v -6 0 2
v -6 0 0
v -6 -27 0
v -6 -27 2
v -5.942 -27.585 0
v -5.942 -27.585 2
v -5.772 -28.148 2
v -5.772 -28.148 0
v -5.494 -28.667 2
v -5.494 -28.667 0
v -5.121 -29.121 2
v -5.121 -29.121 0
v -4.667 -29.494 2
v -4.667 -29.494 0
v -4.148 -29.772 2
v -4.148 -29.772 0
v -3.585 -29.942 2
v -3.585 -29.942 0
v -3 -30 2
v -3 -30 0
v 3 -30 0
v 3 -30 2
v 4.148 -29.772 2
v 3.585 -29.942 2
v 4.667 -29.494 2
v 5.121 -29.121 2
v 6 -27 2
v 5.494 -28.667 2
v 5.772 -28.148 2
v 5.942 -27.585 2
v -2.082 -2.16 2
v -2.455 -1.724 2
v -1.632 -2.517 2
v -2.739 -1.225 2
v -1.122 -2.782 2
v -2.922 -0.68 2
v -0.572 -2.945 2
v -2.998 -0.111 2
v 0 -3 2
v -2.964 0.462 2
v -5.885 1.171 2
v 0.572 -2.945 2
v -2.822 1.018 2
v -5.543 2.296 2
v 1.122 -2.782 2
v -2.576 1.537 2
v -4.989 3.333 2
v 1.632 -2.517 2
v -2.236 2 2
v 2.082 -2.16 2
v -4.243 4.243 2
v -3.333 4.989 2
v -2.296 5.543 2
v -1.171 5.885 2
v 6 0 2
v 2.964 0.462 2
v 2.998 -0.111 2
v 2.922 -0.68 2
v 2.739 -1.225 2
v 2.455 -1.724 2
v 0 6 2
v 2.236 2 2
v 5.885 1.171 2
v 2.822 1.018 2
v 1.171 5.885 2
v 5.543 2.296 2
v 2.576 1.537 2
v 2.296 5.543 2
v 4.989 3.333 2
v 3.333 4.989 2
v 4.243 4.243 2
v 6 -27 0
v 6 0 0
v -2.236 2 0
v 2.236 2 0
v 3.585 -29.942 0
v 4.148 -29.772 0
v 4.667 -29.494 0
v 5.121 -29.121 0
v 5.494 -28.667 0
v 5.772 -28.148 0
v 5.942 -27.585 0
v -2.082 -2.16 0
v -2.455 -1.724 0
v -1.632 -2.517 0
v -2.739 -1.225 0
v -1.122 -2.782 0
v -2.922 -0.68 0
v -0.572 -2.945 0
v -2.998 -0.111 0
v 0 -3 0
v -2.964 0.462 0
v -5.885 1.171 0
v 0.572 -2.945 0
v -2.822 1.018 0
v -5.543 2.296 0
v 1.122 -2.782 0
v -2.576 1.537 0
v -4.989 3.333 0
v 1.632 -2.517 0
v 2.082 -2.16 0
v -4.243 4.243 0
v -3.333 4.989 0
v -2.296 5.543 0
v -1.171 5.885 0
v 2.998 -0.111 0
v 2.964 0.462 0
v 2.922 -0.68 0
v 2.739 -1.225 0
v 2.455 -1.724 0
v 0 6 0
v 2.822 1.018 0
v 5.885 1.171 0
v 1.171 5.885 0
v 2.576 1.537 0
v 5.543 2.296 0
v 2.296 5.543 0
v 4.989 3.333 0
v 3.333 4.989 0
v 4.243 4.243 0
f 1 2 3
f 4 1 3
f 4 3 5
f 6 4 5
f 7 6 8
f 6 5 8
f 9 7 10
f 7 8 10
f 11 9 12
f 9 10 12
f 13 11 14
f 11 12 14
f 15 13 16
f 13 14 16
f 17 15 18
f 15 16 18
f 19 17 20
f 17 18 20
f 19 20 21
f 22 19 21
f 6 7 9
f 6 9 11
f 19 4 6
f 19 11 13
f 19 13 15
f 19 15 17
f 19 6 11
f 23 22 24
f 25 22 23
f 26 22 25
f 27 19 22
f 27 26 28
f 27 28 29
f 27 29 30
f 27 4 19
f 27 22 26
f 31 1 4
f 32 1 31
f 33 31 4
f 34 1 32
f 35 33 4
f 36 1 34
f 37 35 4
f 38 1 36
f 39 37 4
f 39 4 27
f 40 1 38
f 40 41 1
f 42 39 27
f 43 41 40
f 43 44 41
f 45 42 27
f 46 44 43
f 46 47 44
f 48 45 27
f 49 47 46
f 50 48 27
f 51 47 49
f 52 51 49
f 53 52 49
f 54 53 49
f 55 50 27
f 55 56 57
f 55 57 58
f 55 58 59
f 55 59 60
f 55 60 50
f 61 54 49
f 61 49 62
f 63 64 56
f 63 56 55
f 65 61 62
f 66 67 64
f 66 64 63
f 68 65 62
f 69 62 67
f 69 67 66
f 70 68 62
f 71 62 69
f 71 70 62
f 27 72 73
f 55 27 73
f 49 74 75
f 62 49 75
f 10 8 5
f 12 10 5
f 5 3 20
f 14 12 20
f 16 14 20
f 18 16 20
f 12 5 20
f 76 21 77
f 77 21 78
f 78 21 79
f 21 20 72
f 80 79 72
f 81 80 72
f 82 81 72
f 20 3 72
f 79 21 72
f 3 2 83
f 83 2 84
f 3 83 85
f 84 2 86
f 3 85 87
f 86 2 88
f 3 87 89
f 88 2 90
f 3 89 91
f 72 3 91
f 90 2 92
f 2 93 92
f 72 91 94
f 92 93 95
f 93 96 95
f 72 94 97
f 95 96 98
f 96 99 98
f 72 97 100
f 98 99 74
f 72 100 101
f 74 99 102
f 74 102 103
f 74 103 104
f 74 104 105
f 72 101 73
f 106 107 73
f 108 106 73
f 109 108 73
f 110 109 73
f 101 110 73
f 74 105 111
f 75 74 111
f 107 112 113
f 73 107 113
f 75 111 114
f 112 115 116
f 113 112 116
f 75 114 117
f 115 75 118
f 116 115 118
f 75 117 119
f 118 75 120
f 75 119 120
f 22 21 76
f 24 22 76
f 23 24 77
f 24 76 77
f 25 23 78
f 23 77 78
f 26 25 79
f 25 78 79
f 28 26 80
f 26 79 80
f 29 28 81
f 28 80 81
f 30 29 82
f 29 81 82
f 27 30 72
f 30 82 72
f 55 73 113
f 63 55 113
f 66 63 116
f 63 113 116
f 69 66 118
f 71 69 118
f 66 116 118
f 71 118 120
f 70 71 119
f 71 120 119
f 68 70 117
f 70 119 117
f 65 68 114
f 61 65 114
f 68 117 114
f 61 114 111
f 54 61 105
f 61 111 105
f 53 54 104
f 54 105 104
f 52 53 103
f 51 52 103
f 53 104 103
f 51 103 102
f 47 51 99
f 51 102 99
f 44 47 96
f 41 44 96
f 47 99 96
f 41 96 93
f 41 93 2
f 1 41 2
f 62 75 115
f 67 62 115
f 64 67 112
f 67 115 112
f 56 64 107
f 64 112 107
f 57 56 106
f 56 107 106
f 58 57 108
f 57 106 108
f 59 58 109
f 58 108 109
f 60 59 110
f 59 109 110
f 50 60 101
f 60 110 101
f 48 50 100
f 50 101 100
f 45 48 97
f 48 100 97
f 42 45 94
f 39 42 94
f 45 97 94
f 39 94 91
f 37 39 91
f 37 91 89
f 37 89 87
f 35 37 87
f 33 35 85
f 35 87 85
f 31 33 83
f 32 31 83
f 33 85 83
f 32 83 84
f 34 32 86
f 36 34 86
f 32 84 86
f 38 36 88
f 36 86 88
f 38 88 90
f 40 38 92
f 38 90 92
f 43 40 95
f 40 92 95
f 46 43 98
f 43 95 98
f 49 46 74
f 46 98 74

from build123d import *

# Parameters (mm, degrees)
BOSS_EXTRUDE1_DEPTH = 2


with BuildPart() as part:
    # Sketch1 → Boss-Extrude1 (new body)
    with BuildSketch(Plane.XY):
        with BuildLine():
            Line((-6, 0), (-6, -27))
            ThreePointArc((-6, -27), (-5.121320344, -29.121320344), (-3, -30))
            Line((-3, -30), (3, -30))
            ThreePointArc((3, -30), (5.121320344, -29.121320344), (6, -27))
            Line((6, -27), (6, 0))
            ThreePointArc((6, 0), (0, 6), (-6, 0))
        make_face()
        with BuildLine():
            Line((-2.236067977, 2), (2.236067977, 2))
            ThreePointArc((2.236067977, 2), (0, -3), (-2.236067977, 2))
        make_face(mode=Mode.SUBTRACT)
    extrude(amount=BOSS_EXTRUDE1_DEPTH)


solid = part.part
